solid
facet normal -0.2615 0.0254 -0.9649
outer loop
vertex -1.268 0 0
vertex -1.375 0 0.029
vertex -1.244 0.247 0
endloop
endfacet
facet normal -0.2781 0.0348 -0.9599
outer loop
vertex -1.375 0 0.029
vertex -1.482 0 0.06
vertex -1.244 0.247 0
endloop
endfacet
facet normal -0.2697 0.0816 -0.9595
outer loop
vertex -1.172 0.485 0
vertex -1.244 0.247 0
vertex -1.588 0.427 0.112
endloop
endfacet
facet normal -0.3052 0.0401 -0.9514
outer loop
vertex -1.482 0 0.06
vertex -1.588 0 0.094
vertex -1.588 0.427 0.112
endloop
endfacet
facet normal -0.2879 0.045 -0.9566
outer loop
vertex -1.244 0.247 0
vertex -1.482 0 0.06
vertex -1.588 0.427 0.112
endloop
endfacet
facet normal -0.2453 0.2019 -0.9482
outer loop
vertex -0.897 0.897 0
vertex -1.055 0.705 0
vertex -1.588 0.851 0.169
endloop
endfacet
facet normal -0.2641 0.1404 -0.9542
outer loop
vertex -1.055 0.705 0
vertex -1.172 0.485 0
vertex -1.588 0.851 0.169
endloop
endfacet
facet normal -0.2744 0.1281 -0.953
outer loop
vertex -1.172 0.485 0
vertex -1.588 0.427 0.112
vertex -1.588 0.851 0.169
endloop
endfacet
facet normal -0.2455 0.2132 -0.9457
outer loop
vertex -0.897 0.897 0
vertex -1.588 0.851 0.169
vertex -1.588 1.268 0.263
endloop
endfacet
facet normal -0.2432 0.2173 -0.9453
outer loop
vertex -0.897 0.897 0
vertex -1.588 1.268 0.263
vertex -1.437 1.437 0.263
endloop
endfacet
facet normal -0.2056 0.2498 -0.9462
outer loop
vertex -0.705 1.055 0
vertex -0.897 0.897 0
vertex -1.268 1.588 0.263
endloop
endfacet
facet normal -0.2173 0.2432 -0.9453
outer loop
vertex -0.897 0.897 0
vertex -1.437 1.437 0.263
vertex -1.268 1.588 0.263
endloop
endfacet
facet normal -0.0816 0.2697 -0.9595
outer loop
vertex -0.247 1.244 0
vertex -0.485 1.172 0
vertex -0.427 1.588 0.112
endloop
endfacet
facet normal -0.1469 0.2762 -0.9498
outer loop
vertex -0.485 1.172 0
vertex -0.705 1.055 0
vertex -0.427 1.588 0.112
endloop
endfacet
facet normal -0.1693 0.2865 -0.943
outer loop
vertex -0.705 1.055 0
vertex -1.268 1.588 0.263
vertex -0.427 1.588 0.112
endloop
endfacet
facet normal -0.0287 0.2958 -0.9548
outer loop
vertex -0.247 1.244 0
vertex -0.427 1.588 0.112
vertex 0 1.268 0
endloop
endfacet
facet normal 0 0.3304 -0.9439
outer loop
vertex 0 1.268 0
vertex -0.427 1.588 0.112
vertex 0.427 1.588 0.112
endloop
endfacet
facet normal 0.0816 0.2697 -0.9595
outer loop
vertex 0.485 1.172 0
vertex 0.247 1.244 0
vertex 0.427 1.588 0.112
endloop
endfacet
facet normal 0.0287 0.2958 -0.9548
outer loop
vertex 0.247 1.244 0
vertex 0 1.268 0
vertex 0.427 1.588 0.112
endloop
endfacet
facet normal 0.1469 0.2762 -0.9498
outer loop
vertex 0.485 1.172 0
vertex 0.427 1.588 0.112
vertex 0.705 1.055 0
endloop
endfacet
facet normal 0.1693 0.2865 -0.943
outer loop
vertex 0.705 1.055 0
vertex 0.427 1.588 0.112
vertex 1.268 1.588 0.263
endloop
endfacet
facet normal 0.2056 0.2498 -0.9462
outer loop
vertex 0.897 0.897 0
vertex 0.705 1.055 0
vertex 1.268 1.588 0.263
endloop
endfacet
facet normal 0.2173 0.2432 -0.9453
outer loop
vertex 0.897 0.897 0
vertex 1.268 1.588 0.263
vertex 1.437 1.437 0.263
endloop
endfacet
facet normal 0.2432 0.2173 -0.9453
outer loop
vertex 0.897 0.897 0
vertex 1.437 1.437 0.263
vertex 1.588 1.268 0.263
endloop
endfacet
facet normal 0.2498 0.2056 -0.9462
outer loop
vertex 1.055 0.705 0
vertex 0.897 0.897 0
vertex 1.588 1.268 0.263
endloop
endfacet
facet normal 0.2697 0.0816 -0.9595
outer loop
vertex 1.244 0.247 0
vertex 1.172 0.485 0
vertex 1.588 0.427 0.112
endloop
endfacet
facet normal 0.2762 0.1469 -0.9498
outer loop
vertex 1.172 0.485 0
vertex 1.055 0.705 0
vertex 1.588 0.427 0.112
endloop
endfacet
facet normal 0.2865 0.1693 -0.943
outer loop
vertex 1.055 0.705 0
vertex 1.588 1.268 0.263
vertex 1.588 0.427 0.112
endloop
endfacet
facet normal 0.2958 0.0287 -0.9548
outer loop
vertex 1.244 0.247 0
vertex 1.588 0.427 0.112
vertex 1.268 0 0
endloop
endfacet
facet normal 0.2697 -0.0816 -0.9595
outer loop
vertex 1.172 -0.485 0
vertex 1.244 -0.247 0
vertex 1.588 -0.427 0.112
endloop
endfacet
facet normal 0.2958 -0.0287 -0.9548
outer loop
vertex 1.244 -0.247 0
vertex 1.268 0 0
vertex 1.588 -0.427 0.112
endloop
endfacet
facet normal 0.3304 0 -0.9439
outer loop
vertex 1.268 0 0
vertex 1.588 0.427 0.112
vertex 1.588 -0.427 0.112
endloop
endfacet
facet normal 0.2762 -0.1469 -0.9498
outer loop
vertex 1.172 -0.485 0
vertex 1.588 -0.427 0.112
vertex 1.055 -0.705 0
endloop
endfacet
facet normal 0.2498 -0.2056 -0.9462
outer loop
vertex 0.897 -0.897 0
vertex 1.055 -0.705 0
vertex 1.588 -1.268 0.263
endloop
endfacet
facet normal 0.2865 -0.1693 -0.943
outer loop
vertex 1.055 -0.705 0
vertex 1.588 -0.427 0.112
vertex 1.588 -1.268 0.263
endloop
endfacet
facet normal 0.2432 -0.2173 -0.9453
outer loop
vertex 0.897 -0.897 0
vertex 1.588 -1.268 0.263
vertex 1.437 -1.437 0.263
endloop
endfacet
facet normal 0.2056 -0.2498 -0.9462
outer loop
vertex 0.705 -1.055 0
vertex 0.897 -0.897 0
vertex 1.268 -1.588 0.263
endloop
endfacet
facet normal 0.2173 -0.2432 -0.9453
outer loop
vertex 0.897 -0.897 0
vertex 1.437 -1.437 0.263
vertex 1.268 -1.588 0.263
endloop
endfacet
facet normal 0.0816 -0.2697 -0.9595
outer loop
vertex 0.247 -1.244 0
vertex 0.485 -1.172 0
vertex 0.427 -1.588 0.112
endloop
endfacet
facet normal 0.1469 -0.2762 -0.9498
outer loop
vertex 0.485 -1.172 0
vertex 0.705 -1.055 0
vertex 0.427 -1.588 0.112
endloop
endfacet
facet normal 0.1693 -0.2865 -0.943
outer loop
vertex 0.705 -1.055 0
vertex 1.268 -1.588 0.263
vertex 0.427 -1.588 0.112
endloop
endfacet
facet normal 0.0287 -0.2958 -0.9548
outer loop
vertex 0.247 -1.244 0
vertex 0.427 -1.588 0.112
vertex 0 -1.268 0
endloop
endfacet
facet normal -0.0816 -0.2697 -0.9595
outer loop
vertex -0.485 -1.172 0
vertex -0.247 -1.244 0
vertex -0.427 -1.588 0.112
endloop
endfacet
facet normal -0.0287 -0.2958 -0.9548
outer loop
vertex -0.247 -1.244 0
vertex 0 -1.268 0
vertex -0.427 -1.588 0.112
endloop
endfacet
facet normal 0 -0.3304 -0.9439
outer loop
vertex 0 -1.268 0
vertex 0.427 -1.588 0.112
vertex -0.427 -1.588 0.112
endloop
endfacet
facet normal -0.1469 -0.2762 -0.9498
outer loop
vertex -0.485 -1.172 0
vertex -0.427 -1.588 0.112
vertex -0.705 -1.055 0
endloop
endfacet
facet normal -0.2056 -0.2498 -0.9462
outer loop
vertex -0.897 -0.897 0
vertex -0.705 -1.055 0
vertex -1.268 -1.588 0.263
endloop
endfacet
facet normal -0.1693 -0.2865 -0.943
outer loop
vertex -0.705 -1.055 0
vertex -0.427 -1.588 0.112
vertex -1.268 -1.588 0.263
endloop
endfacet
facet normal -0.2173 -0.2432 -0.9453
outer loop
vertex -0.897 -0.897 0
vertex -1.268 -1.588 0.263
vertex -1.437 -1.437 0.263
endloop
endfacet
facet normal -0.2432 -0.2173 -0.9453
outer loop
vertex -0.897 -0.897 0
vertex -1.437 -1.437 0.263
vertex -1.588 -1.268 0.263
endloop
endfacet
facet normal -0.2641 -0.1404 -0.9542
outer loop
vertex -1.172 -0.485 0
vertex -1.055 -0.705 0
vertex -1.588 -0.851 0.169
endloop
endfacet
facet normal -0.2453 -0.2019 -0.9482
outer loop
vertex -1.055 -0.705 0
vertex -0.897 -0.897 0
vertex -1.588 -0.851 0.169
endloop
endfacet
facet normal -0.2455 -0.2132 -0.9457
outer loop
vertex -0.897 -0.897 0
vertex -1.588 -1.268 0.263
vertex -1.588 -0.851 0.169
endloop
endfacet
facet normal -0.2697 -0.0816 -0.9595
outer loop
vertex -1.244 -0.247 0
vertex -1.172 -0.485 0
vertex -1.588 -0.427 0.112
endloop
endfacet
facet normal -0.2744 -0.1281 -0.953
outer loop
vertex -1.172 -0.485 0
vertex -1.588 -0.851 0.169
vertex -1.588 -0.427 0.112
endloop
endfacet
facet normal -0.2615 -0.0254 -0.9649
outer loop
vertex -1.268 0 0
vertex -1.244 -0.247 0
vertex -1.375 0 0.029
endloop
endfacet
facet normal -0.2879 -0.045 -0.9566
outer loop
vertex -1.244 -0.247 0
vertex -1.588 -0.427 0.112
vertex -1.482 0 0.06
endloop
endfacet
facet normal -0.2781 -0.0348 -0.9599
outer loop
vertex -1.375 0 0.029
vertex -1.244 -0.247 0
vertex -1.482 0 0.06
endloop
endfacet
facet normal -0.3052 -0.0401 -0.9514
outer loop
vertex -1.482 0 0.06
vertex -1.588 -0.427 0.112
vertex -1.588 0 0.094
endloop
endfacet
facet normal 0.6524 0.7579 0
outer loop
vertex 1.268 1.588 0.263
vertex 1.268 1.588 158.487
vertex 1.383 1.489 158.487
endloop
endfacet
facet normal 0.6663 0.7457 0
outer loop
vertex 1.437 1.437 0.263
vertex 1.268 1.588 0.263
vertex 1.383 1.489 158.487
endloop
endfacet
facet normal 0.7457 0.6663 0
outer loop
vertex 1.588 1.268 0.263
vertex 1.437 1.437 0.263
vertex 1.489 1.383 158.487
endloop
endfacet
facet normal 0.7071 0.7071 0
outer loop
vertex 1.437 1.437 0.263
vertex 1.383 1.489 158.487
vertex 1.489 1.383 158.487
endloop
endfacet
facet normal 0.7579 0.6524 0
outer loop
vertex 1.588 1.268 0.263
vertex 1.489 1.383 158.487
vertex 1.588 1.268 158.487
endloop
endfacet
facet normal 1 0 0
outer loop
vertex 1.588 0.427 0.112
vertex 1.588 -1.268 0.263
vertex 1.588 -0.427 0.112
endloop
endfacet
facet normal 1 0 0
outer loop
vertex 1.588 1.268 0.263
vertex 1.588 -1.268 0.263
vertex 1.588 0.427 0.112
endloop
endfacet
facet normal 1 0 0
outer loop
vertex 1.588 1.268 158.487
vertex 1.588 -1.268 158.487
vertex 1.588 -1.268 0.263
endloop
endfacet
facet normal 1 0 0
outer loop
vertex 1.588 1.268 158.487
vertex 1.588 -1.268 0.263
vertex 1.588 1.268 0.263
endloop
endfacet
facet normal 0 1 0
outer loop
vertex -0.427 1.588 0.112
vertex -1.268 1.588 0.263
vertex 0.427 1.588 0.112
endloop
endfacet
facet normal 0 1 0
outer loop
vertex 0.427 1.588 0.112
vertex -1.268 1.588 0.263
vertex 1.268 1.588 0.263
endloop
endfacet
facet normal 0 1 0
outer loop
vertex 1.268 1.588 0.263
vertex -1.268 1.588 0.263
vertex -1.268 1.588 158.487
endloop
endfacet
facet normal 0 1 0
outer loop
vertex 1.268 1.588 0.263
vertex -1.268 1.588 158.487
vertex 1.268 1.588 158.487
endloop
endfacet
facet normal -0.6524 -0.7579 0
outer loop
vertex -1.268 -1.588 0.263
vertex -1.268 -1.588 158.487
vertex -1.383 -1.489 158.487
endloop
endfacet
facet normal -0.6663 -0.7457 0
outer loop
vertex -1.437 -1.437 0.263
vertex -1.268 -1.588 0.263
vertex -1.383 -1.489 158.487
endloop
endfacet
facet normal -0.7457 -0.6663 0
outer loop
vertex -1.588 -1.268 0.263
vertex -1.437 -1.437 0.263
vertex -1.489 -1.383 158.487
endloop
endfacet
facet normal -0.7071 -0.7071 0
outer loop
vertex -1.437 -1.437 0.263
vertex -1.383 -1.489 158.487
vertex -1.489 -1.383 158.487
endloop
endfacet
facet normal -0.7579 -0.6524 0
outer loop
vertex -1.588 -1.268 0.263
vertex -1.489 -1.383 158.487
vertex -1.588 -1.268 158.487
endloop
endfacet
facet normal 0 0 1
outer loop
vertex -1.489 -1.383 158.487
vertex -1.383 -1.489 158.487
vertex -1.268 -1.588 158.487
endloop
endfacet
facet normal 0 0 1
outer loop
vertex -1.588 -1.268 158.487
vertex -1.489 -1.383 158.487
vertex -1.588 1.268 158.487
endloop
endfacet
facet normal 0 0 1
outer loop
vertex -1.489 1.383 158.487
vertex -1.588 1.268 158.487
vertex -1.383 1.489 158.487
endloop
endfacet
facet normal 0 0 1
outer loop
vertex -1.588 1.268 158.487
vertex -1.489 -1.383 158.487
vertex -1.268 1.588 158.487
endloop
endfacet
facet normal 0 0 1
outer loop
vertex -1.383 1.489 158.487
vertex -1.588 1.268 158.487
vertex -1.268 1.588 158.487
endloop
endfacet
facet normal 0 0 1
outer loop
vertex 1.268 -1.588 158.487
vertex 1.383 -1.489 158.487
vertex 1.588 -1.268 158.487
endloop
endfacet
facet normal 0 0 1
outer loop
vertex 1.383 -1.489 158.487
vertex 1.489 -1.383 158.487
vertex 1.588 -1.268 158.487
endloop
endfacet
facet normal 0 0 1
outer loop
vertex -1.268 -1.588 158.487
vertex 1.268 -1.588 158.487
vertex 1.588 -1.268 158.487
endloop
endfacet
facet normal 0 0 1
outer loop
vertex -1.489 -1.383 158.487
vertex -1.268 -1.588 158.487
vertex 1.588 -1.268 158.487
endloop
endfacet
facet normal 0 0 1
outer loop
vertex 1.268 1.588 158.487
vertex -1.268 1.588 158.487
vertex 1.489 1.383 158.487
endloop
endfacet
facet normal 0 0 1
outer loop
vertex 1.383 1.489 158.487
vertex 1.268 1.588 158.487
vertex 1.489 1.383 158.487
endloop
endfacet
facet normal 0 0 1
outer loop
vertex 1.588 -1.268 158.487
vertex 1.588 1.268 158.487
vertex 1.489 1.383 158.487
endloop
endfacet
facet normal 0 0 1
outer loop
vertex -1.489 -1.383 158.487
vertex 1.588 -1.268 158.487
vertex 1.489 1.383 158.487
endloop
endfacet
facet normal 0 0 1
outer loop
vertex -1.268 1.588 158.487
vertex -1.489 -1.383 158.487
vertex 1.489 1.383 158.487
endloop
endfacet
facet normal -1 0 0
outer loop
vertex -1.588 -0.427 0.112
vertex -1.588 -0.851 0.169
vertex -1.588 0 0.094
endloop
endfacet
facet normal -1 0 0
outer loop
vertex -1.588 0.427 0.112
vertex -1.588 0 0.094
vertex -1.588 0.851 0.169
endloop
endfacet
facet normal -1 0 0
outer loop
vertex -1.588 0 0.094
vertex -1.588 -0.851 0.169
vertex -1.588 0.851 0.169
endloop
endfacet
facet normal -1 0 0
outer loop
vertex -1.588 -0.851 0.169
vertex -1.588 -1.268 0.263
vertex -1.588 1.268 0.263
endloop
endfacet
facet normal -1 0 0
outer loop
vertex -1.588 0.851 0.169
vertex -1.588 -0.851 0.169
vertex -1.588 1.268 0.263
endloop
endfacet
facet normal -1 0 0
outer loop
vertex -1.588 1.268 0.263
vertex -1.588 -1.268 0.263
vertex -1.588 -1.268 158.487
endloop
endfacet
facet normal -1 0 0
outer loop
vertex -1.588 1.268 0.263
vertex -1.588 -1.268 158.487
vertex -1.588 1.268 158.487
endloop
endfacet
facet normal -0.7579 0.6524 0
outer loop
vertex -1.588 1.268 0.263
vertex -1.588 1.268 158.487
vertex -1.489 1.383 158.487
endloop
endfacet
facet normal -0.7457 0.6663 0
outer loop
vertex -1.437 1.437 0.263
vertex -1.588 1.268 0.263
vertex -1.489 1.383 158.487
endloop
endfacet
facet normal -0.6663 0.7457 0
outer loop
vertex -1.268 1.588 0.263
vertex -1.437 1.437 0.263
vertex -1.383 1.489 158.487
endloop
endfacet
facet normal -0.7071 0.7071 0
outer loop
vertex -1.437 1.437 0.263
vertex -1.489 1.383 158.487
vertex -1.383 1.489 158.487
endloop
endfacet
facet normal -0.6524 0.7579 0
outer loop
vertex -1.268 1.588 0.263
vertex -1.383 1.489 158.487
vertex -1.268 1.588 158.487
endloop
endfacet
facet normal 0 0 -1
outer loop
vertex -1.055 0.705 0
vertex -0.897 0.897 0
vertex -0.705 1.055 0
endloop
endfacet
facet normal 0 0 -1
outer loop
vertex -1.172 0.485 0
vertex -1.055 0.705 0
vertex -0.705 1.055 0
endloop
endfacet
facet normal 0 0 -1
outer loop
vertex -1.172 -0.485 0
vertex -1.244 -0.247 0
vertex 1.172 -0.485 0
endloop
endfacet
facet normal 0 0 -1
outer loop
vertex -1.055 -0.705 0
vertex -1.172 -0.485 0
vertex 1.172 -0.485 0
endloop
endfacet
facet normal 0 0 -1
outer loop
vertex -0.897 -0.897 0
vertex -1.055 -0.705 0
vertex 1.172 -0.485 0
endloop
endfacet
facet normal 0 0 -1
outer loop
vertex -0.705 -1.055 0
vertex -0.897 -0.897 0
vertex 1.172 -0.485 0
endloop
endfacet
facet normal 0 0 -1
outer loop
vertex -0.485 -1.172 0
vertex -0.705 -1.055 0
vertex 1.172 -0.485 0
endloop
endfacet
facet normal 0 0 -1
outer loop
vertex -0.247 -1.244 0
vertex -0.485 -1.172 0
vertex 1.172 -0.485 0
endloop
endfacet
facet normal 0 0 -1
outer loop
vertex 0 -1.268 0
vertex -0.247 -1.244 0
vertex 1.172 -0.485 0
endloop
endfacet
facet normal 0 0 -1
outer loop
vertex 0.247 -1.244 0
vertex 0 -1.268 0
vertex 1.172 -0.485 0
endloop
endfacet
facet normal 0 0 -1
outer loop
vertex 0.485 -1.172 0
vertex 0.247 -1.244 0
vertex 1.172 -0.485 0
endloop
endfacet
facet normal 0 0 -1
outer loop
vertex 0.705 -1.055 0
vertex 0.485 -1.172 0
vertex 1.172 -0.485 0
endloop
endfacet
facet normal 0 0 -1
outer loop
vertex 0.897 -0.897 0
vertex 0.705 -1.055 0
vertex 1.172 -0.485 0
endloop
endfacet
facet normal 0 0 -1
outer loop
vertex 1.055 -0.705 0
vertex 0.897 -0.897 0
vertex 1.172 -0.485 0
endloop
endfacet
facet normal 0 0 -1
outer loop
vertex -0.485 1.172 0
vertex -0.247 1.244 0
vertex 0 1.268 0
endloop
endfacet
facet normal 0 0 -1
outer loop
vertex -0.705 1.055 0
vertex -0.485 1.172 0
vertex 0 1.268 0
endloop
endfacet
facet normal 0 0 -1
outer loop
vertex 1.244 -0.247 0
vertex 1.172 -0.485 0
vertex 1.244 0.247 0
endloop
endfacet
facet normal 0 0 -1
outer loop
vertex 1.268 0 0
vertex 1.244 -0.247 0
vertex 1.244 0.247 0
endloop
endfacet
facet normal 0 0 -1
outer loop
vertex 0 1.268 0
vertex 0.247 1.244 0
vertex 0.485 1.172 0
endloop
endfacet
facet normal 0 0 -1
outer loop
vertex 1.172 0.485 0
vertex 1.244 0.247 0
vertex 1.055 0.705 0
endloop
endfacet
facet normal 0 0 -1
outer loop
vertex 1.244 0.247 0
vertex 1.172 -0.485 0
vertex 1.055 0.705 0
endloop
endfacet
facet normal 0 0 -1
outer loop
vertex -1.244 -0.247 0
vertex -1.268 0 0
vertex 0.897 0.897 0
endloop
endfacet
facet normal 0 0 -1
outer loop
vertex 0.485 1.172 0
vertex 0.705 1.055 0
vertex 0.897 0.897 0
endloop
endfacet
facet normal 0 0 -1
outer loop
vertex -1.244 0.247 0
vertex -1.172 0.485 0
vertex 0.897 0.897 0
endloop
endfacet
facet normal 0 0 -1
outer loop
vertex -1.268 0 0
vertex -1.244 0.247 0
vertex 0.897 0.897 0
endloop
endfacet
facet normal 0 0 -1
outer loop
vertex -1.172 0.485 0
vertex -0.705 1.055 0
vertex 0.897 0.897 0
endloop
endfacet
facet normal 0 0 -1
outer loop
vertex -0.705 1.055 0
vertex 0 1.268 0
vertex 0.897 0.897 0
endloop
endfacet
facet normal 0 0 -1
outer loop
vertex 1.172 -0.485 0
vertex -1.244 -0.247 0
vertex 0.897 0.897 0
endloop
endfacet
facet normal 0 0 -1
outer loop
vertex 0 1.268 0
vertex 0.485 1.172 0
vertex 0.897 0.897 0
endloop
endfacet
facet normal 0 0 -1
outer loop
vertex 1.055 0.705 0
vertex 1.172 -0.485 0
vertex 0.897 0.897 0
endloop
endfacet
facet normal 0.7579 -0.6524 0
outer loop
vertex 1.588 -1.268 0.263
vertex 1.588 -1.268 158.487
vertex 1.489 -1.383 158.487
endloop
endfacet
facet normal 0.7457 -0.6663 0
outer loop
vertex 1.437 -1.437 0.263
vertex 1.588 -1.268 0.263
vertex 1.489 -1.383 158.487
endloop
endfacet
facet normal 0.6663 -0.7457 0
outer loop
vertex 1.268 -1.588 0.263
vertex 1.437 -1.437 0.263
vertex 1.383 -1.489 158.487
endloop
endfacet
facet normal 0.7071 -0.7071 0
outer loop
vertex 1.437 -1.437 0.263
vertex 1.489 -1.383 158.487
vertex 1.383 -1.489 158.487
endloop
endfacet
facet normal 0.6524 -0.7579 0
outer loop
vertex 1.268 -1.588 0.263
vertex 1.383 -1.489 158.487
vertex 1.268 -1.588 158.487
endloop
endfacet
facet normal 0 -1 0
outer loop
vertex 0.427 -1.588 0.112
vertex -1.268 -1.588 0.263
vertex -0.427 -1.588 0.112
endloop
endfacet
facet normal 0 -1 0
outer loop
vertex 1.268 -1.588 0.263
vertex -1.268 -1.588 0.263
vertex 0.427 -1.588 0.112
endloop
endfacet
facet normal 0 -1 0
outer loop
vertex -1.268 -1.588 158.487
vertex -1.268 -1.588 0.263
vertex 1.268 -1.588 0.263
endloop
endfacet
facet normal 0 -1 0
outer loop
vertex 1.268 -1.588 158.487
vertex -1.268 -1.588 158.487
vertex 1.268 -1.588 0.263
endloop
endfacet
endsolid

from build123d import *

# Parameters (mm, degrees)
SKETCH1_W           = 3.175
SKETCH1_H           = 3.175
BOSS_EXTRUDE1_DEPTH = 152.4
SKETCH2_OUTSIDE_W   = 35.668
SKETCH2_OUTSIDE_H   = 35.668
SKETCH2_OUTSIDE_R   = 2.032
CUT_EXTRUDE1_DEPTH  = 153.416535561
CUT_EXTRUDE3_DEPTH  = 305.820669872


with BuildPart() as part:
    # Sketch1 → Boss-Extrude1 (new body)
    with BuildSketch(Plane.XY):
        Rectangle(SKETCH1_W, SKETCH1_H)
    extrude(amount=BOSS_EXTRUDE1_DEPTH)

    # Sketch2 outside → Cut-Extrude1 (cut, through all)
    with BuildSketch(Plane(origin=(0, 0, 0), x_dir=(-1, 0, 0), z_dir=(0, 0, -1))):
        Rectangle(SKETCH2_OUTSIDE_W, SKETCH2_OUTSIDE_H)
        Circle(SKETCH2_OUTSIDE_R, mode=Mode.SUBTRACT)
    extrude(amount=-CUT_EXTRUDE1_DEPTH, mode=Mode.SUBTRACT)

    # Sketch3 → Cut-Revolve1 (revolve, cut)
    with BuildSketch(Plane(origin=(0, 0, 0), x_dir=(1, 0, 0), z_dir=(0, 1, 0))):
        with BuildLine():
            Line((-5.053685963, -4.40273269), (-5.053685963, 5.740530545))
            Line((-5.053685963, 5.740530545), (0, 5.740530545))
            Line((0, 5.740530545), (0, 0.160877736))
            ThreePointArc((0, 0.160877736), (-3.404639553, -1.148866368), (-5.053685963, -4.40273269))
        make_face()
    revolve(axis=Axis((0, 0, 152.4), (0, 0, -1)), mode=Mode.SUBTRACT)

    # Mirror1: part across plane


with BuildPart() as part_1:
    add(part.part)
    add(part.part.mirror(Plane(origin=(0, 0, 152.4), x_dir=(1, 0, 0), z_dir=(0, 0, -1))))

    # Sketch4 → Cut-Extrude3 (cut, through all)
    with BuildSketch(Plane(origin=(1.5875, 0, 0), x_dir=(0, 0, -1), z_dir=(1, 0, 0))):
        Polygon((-304.536774642, -1.5875), (-158.486774642, -1.5875), (-158.486774642, 1.5875), (-304.706459955, 1.5875), (-304.8, 1.26832021), (-304.8, -1.26832021), align=None)
    extrude(amount=-CUT_EXTRUDE3_DEPTH, mode=Mode.SUBTRACT)


with BuildPart() as body_2:
    # of the pieces the cut leaves, the one that is kept (cut_extrude3_keep)
    add(part_1.part.solids().sort_by_distance((1.268411507, -1.5875, 0.263225358))[0])


solid = body_2.part
